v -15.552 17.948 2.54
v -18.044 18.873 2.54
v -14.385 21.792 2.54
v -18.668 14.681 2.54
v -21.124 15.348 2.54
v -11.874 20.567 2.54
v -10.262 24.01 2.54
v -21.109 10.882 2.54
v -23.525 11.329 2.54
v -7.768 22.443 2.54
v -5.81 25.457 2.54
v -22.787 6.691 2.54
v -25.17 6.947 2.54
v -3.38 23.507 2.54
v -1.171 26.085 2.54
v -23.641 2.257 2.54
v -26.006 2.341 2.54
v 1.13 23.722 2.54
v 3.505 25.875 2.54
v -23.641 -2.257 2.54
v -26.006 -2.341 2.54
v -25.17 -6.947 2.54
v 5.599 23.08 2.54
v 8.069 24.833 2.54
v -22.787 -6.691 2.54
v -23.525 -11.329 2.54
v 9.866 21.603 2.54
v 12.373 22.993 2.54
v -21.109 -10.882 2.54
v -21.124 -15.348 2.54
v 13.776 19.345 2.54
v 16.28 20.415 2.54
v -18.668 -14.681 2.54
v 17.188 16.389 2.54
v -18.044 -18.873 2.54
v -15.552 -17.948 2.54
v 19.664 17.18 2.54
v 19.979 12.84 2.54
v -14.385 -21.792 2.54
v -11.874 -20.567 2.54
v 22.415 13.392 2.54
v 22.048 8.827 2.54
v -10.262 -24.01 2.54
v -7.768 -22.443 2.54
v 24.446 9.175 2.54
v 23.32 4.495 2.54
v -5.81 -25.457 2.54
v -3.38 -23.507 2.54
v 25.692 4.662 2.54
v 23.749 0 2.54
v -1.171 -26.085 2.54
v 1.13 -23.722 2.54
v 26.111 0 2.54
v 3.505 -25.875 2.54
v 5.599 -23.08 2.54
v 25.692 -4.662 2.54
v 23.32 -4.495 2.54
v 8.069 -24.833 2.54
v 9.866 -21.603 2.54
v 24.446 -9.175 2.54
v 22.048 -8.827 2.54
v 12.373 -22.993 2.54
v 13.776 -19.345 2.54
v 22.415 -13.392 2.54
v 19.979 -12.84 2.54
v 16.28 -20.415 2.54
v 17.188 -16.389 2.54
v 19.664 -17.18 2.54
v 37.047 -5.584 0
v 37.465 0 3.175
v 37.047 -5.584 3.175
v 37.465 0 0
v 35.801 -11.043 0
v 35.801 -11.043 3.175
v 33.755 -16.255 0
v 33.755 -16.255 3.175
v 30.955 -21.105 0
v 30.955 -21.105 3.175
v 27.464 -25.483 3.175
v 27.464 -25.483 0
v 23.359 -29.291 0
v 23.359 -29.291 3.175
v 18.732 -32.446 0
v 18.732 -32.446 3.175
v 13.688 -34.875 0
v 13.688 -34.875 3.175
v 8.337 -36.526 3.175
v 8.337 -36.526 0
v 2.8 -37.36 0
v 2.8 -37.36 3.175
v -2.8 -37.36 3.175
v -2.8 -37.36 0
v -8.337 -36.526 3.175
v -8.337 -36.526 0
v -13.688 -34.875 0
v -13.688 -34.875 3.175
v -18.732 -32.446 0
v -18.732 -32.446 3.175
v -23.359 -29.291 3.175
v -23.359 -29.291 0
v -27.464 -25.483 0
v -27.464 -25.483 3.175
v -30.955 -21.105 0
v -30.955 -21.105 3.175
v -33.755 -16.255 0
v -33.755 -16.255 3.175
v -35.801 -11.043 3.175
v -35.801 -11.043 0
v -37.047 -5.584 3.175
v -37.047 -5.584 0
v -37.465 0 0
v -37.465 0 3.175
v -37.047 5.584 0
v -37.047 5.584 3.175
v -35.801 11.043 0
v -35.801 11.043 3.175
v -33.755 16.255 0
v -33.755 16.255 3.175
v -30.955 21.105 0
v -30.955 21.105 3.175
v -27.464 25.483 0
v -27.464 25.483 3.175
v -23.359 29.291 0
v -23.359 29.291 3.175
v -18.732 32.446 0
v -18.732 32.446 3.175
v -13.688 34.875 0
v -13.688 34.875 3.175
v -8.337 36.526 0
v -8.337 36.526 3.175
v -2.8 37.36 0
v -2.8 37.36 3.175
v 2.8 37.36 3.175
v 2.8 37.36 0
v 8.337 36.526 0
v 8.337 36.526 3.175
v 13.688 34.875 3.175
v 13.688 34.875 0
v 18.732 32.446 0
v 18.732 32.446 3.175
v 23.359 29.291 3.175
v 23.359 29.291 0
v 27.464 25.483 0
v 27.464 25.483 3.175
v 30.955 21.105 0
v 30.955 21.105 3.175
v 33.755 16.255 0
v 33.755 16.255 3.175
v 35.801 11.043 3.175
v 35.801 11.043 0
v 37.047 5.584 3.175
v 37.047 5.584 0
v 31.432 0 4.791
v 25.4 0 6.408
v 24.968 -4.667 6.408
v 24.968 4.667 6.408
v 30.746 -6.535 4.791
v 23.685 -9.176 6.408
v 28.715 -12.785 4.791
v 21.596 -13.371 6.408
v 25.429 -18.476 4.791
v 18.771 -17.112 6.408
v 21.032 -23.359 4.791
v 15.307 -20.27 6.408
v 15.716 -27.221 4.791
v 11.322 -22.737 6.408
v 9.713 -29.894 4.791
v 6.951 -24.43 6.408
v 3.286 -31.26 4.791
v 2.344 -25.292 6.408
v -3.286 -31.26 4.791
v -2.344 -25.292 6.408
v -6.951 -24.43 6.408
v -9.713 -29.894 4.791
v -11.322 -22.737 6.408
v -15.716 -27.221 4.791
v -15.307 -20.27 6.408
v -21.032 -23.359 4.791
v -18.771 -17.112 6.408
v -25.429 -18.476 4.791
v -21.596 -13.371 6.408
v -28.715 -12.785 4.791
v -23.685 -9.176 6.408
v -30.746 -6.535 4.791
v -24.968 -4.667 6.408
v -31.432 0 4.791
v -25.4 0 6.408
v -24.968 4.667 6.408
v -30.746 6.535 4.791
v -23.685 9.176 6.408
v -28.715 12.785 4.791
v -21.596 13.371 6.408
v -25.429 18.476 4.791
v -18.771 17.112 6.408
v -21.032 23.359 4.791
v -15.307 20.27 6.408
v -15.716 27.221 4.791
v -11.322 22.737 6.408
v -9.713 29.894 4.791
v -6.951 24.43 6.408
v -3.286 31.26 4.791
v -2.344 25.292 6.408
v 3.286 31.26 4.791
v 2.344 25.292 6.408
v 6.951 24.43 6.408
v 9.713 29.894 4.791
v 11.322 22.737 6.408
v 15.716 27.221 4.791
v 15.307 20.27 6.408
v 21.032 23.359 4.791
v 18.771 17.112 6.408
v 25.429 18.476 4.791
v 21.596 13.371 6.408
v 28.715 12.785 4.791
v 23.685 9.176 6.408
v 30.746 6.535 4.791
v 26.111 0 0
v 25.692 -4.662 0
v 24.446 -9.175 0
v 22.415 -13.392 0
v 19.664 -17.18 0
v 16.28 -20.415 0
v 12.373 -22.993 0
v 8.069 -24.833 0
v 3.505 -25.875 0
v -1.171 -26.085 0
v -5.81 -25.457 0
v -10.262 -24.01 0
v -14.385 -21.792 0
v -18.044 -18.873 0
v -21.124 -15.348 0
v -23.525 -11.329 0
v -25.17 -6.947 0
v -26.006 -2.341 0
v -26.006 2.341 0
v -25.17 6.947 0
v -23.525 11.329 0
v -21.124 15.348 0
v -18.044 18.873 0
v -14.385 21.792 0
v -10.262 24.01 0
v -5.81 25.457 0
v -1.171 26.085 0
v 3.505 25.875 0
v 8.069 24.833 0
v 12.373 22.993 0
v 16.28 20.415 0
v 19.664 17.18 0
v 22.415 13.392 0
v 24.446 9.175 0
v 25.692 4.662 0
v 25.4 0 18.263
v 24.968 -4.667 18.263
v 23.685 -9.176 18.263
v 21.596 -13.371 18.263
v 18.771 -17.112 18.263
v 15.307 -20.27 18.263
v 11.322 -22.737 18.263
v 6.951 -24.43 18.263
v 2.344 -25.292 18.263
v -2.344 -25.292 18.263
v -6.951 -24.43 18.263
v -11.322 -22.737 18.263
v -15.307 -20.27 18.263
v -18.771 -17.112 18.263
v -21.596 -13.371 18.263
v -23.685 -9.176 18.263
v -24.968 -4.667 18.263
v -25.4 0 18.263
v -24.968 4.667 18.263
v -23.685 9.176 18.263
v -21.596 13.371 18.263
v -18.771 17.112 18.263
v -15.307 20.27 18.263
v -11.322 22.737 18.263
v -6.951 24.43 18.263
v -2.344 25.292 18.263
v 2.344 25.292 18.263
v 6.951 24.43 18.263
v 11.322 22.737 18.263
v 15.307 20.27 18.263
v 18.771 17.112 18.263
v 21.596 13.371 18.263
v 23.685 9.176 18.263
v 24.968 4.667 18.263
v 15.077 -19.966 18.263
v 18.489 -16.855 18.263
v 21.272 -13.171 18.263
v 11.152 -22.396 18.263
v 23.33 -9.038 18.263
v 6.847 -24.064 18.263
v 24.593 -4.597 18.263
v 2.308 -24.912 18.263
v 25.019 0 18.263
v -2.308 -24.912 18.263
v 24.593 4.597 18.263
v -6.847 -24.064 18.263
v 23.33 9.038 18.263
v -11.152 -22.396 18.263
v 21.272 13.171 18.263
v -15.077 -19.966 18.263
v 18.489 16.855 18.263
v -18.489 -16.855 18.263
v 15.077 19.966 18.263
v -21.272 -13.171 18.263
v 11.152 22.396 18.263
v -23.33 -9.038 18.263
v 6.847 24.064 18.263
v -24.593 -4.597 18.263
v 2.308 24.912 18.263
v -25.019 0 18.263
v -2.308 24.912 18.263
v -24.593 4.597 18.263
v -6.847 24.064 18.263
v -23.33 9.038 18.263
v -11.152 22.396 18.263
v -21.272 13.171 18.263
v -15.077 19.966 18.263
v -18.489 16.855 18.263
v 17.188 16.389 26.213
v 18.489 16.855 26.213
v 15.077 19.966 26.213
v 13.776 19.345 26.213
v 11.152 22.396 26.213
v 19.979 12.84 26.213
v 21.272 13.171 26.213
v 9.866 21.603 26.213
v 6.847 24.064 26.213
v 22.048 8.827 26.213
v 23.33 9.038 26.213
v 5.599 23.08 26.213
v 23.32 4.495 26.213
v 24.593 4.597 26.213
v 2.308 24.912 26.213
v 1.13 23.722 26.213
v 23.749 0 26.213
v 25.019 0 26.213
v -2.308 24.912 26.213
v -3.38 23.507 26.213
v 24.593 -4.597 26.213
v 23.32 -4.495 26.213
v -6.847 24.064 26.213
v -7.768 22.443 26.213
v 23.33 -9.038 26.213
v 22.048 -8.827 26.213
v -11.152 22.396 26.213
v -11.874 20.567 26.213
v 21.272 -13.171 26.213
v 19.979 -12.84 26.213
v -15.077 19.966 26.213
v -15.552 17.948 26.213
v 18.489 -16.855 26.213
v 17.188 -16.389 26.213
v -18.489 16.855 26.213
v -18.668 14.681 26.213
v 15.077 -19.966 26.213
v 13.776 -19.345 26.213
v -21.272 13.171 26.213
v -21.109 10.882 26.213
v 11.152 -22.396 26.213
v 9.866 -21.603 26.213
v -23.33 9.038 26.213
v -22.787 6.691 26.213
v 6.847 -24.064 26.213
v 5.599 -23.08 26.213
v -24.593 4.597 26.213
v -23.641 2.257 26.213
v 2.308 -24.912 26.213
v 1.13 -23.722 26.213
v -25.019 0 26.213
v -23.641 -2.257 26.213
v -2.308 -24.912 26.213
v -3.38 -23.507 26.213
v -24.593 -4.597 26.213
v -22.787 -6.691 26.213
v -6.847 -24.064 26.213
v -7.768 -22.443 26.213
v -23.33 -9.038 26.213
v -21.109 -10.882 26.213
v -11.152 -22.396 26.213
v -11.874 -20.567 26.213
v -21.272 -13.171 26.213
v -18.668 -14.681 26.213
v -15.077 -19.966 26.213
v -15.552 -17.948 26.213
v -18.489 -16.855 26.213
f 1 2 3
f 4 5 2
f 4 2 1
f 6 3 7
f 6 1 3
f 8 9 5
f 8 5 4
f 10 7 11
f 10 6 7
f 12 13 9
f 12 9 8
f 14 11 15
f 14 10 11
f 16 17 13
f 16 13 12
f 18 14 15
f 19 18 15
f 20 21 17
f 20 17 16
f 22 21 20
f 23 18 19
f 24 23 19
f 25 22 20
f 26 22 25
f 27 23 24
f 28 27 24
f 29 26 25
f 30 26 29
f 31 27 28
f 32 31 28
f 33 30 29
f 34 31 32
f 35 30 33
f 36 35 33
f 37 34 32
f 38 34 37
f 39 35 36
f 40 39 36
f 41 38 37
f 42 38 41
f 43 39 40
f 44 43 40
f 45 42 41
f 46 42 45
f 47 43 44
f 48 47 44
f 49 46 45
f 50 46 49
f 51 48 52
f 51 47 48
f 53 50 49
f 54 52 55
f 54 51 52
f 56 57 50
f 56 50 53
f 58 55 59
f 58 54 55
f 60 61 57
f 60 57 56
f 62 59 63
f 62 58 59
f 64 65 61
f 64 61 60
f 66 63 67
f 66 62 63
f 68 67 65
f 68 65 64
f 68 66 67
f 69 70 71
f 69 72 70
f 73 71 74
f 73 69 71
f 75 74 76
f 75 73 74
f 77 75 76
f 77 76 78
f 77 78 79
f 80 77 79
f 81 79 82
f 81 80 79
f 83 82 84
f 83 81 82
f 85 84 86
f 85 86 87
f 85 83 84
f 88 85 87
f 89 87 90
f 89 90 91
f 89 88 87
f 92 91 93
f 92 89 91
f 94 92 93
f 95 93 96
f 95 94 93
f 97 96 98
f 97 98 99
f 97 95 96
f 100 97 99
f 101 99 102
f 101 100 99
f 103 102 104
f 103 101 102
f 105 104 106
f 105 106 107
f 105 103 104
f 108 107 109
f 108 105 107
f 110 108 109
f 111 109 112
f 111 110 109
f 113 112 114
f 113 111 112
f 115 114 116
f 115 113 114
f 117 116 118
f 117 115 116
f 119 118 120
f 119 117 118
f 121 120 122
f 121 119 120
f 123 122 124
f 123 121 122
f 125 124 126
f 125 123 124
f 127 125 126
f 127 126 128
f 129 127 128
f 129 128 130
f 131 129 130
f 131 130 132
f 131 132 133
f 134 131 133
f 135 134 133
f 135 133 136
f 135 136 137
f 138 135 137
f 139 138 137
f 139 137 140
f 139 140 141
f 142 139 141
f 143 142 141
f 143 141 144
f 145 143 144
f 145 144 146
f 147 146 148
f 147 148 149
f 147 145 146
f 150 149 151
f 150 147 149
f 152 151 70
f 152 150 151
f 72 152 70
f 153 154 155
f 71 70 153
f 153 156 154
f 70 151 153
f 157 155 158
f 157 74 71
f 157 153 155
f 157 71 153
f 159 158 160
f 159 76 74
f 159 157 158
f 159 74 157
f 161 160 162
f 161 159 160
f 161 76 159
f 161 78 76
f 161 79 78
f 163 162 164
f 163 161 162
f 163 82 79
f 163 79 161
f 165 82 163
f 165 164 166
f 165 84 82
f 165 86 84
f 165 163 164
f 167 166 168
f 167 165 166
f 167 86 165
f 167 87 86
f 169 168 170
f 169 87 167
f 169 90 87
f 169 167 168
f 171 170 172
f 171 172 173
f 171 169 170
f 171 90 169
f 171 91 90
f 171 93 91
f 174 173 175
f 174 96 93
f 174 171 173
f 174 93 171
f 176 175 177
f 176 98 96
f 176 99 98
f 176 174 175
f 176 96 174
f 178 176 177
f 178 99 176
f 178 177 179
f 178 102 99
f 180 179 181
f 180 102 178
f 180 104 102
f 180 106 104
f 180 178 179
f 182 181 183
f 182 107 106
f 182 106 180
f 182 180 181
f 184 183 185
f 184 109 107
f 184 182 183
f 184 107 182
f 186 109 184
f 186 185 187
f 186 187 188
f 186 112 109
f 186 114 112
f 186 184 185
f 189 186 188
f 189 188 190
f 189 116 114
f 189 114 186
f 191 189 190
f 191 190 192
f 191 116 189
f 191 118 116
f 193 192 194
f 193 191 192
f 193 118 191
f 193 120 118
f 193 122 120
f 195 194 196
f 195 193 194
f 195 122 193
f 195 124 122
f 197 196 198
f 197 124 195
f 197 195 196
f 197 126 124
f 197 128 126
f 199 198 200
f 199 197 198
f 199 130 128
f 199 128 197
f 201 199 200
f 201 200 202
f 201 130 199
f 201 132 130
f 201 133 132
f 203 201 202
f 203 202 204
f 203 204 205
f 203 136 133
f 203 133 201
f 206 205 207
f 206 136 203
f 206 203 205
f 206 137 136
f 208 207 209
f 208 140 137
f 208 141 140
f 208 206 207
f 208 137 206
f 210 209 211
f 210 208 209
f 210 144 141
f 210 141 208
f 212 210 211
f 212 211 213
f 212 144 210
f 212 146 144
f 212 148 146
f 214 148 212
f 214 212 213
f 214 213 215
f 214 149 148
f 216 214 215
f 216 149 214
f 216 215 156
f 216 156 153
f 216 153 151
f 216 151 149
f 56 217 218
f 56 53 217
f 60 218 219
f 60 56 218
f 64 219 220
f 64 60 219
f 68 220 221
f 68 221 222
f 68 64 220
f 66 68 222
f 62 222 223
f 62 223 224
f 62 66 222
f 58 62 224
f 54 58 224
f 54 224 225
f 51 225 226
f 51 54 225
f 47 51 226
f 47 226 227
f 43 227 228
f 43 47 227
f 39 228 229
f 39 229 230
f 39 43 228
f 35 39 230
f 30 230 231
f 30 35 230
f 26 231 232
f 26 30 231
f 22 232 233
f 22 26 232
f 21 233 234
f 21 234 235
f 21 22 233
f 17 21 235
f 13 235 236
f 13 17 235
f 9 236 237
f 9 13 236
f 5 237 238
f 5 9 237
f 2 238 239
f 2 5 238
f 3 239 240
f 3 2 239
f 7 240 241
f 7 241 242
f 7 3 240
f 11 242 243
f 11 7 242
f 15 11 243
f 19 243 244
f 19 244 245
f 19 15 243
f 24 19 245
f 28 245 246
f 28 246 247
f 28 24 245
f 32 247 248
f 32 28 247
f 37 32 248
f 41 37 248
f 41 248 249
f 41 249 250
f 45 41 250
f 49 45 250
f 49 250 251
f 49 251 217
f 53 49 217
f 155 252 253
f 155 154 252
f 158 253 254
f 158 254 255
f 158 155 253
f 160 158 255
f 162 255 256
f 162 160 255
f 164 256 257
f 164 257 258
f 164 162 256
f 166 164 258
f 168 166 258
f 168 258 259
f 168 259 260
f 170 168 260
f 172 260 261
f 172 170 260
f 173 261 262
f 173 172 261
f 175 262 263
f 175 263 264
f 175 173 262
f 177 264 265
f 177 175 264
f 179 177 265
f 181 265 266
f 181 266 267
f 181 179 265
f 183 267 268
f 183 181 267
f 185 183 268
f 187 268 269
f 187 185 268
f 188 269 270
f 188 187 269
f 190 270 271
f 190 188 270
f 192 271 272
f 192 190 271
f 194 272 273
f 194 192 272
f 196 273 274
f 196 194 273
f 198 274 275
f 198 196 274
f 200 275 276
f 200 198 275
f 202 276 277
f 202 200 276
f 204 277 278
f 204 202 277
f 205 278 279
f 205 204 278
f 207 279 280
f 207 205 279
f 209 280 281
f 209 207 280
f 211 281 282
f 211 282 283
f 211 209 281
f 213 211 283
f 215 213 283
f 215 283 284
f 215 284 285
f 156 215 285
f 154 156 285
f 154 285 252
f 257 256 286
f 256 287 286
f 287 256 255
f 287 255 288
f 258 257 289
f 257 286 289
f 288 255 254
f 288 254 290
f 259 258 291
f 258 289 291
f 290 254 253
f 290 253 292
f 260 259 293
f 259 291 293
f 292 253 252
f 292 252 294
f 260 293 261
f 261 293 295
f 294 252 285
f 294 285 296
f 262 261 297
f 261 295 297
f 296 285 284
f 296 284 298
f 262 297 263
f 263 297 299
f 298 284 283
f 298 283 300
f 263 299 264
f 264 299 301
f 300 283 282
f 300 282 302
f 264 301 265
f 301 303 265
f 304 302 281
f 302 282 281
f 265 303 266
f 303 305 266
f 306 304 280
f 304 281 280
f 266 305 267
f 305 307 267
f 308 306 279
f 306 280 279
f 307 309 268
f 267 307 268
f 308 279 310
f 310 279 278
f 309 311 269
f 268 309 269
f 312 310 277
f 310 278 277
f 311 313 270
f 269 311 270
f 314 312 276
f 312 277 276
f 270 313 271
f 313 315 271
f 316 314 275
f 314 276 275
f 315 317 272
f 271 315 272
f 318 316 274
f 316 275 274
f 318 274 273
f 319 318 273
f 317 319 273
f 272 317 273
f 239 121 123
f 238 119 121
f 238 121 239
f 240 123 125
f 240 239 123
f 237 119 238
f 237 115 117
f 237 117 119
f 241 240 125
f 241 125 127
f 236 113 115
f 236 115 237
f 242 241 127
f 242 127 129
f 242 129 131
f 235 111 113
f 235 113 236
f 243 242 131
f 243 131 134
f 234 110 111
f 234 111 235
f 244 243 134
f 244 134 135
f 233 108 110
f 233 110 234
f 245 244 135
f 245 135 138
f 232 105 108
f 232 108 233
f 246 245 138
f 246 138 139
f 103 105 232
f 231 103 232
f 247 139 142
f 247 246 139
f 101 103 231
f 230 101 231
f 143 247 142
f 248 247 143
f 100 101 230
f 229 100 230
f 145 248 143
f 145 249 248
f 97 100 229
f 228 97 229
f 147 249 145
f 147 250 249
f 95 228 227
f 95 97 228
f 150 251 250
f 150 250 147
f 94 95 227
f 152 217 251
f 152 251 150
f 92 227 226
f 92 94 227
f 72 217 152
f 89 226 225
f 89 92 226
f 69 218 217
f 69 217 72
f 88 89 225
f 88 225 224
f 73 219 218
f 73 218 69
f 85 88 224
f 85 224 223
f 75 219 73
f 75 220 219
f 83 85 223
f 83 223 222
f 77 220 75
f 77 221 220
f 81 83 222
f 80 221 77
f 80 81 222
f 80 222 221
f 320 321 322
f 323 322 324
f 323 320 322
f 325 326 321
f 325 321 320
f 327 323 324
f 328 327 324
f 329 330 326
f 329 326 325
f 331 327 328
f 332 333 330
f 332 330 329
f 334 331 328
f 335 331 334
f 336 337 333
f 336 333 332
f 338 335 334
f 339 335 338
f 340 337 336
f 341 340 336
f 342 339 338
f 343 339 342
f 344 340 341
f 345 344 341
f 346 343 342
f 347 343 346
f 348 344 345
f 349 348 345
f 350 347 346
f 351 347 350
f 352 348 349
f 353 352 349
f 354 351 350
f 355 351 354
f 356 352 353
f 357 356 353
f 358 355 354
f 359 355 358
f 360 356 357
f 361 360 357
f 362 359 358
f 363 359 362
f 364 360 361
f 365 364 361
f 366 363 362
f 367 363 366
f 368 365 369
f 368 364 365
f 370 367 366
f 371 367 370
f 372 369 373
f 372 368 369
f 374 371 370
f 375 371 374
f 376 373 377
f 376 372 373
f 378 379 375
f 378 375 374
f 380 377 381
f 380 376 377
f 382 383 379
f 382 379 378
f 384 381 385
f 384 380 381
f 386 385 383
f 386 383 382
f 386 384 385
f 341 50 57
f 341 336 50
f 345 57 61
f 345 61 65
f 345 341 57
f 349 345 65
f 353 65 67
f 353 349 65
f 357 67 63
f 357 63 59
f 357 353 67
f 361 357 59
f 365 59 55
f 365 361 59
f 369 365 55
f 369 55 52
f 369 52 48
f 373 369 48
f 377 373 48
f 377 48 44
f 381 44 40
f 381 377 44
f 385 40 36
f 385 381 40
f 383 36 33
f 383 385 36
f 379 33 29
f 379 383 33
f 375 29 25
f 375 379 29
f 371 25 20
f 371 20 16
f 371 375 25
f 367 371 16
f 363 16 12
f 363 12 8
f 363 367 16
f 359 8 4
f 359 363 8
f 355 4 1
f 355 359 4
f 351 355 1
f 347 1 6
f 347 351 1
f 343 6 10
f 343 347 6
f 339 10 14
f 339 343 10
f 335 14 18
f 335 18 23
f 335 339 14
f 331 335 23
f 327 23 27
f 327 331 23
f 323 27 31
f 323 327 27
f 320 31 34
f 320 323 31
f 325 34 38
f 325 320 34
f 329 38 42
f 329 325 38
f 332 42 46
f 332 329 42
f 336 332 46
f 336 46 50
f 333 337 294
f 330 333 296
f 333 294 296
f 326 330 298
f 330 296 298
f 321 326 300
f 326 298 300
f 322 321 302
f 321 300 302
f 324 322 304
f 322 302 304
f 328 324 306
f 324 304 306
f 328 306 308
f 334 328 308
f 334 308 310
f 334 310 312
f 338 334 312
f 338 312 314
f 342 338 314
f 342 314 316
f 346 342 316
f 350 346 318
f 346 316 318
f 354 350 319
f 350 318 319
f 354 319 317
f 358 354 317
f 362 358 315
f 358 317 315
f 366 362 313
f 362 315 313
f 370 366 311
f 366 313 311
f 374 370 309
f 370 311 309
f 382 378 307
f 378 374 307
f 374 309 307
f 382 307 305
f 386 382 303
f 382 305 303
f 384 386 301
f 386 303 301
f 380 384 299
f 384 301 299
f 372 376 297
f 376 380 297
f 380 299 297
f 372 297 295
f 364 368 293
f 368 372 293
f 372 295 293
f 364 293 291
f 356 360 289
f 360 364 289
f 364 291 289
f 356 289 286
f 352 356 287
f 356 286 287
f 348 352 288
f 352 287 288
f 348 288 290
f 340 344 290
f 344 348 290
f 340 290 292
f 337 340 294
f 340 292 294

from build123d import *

# Parameters (mm, degrees)
SKETCH2_W = 21.629907471
SKETCH2_H = 12.119969406


with BuildPart() as part:
    # Sketch1 → Revolve1 (revolve)
    with BuildSketch(Plane(origin=(0, 0, 0), x_dir=(0, 0, -1), z_dir=(1, 0, 0)), mode=Mode.PRIVATE) as revolve1_sk:
        Polygon((0, 26.1112), (-2.54, 26.1112), (-2.54, 23.749), (-26.2128, 23.749), (-26.2128, 25.4), (-6.407807007, 25.4), (-3.175, 37.465), (0, 37.465), align=None)
    revolve(revolve1_sk.sketch.rotate(Axis((0, 0, 56.040860285), (0, 0, -1)), 90), axis=Axis((0, 0, 56.040860285), (0, 0, -1)))

    # Sketch2 → Cut-Revolve1 (revolve, cut)
    with BuildSketch(Plane(origin=(0, 0, 0), x_dir=(0, 0, -1), z_dir=(1, 0, 0)), mode=Mode.PRIVATE) as cut_revolve1_sk:
        with Locations((-29.077553736, 31.078984703)):
            Rectangle(SKETCH2_W, SKETCH2_H)
    revolve(cut_revolve1_sk.sketch.rotate(Axis((0, 0, 38.126599349), (0, 0, 1)), 270), axis=Axis((0, 0, 38.126599349), (0, 0, 1)), mode=Mode.SUBTRACT)


solid = part.part
